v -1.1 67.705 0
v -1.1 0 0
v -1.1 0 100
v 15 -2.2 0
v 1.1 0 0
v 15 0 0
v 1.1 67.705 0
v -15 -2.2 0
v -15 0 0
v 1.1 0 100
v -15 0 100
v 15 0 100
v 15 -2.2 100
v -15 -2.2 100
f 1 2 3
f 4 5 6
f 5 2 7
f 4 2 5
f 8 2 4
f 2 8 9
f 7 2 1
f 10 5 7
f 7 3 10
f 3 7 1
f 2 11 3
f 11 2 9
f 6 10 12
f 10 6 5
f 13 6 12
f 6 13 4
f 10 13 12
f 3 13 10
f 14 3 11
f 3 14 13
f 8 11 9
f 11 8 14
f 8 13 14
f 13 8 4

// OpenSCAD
// file sun_dial_gnomon.scad
// Creates a gnomon for a sundial to be used at the given latitude
// 
// (c) 2020 Rich Cameron
// released under a Creative Commons CC-BY 4.0 International License

length = 100; //length of the base of the triangle, mm 
base = 30; //width of the base of the triangle, mm
latitude = 34.1; //latitude of user, degrees 
thickness = 2.2; //thickness of the piece, mm

rotate([90, 0, 90]) linear_extrude(thickness, center = true) polygon([[0, 0], [0, length], [length * tan(abs(latitude)), 0]]);
translate([-base / 2, -thickness, 0]) cube([base, thickness, length]);
